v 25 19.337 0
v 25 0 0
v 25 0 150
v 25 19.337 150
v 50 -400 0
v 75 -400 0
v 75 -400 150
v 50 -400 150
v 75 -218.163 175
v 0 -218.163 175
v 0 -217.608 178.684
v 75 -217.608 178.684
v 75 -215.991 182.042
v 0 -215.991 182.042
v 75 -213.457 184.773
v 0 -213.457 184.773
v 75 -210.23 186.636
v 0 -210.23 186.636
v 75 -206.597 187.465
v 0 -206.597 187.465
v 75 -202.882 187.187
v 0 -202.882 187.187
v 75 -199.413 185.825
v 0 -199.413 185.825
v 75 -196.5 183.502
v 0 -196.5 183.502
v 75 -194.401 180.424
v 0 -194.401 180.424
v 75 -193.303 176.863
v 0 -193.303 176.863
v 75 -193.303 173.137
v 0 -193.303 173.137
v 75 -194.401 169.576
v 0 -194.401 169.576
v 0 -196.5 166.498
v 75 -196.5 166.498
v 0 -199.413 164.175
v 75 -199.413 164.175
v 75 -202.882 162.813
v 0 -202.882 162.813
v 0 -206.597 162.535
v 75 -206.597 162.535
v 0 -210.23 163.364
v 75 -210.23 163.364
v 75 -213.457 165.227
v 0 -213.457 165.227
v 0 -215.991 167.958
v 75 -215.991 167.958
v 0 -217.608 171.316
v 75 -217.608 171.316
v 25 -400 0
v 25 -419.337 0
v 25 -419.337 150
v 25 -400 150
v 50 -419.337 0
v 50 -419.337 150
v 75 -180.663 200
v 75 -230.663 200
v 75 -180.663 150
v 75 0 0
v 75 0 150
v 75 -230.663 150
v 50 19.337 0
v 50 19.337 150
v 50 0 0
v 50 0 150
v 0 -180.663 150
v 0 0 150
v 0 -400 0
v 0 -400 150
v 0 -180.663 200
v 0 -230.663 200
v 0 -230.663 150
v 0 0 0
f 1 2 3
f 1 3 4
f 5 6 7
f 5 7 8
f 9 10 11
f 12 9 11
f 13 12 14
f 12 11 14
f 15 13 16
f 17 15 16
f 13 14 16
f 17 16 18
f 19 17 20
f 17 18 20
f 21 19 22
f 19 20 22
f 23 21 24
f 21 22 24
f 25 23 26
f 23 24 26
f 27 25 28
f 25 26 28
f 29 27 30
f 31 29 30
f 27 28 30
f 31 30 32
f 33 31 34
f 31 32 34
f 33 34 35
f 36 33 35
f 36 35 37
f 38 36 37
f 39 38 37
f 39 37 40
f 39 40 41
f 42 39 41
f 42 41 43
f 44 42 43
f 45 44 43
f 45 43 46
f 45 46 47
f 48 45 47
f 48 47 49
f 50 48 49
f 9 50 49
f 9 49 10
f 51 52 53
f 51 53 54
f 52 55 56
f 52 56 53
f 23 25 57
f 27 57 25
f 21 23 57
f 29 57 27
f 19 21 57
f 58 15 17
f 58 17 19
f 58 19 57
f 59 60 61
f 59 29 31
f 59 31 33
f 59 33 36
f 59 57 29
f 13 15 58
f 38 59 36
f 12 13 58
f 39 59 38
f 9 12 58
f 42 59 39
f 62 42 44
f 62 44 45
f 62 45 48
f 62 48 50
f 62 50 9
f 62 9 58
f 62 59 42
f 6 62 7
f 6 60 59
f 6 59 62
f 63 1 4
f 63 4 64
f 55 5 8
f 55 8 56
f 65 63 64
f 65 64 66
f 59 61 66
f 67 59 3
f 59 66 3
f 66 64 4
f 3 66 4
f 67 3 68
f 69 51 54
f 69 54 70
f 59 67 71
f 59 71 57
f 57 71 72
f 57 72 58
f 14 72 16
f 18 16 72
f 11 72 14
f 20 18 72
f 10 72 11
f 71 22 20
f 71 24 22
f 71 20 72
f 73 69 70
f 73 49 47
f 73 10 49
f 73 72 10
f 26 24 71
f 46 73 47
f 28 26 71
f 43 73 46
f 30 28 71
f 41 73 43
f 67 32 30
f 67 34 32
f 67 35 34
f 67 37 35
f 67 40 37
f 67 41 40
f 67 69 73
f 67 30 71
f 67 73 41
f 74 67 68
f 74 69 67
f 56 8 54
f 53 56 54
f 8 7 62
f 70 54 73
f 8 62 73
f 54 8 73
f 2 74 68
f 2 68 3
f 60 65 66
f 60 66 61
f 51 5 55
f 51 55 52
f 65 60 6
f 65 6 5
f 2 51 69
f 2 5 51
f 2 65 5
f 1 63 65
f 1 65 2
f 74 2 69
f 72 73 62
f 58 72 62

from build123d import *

# Parameters (mm, degrees)
BOSS_EXTRUDE1_DEPTH = 150
SKETCH2_W           = 75
SKETCH2_H           = 50
BOSS_EXTRUDE2_DEPTH = 50
SKETCH3_R           = 12.5
CUT_EXTRUDE1_DEPTH  = 167


with BuildPart() as part:
    # Sketch1 → Boss-Extrude1 (new body)
    with BuildSketch(Plane.XY):
        Polygon((25, 0), (25, 19.336654422), (50, 19.336654422), (50, 0), (75, 0), (75, -400), (50, -400), (50, -419.336654422), (25, -419.336654422), (25, -400), (0, -400), (0, 0), align=None)
    extrude(amount=BOSS_EXTRUDE1_DEPTH)

    # Sketch2 → Boss-Extrude2 (add)
    with BuildSketch(Plane.XY.offset(150)):
        with Locations((37.5, -205.663345578)):
            Rectangle(SKETCH2_W, SKETCH2_H)
    extrude(amount=BOSS_EXTRUDE2_DEPTH)

    # Sketch3 → Cut-Extrude1 (cut)
    with BuildSketch(Plane.ZY):
        with Locations(Location((175, -205.663345578, 0), (0, 0, 270))):
            Circle(SKETCH3_R)
    extrude(amount=-CUT_EXTRUDE1_DEPTH, mode=Mode.SUBTRACT)


solid = part.part
